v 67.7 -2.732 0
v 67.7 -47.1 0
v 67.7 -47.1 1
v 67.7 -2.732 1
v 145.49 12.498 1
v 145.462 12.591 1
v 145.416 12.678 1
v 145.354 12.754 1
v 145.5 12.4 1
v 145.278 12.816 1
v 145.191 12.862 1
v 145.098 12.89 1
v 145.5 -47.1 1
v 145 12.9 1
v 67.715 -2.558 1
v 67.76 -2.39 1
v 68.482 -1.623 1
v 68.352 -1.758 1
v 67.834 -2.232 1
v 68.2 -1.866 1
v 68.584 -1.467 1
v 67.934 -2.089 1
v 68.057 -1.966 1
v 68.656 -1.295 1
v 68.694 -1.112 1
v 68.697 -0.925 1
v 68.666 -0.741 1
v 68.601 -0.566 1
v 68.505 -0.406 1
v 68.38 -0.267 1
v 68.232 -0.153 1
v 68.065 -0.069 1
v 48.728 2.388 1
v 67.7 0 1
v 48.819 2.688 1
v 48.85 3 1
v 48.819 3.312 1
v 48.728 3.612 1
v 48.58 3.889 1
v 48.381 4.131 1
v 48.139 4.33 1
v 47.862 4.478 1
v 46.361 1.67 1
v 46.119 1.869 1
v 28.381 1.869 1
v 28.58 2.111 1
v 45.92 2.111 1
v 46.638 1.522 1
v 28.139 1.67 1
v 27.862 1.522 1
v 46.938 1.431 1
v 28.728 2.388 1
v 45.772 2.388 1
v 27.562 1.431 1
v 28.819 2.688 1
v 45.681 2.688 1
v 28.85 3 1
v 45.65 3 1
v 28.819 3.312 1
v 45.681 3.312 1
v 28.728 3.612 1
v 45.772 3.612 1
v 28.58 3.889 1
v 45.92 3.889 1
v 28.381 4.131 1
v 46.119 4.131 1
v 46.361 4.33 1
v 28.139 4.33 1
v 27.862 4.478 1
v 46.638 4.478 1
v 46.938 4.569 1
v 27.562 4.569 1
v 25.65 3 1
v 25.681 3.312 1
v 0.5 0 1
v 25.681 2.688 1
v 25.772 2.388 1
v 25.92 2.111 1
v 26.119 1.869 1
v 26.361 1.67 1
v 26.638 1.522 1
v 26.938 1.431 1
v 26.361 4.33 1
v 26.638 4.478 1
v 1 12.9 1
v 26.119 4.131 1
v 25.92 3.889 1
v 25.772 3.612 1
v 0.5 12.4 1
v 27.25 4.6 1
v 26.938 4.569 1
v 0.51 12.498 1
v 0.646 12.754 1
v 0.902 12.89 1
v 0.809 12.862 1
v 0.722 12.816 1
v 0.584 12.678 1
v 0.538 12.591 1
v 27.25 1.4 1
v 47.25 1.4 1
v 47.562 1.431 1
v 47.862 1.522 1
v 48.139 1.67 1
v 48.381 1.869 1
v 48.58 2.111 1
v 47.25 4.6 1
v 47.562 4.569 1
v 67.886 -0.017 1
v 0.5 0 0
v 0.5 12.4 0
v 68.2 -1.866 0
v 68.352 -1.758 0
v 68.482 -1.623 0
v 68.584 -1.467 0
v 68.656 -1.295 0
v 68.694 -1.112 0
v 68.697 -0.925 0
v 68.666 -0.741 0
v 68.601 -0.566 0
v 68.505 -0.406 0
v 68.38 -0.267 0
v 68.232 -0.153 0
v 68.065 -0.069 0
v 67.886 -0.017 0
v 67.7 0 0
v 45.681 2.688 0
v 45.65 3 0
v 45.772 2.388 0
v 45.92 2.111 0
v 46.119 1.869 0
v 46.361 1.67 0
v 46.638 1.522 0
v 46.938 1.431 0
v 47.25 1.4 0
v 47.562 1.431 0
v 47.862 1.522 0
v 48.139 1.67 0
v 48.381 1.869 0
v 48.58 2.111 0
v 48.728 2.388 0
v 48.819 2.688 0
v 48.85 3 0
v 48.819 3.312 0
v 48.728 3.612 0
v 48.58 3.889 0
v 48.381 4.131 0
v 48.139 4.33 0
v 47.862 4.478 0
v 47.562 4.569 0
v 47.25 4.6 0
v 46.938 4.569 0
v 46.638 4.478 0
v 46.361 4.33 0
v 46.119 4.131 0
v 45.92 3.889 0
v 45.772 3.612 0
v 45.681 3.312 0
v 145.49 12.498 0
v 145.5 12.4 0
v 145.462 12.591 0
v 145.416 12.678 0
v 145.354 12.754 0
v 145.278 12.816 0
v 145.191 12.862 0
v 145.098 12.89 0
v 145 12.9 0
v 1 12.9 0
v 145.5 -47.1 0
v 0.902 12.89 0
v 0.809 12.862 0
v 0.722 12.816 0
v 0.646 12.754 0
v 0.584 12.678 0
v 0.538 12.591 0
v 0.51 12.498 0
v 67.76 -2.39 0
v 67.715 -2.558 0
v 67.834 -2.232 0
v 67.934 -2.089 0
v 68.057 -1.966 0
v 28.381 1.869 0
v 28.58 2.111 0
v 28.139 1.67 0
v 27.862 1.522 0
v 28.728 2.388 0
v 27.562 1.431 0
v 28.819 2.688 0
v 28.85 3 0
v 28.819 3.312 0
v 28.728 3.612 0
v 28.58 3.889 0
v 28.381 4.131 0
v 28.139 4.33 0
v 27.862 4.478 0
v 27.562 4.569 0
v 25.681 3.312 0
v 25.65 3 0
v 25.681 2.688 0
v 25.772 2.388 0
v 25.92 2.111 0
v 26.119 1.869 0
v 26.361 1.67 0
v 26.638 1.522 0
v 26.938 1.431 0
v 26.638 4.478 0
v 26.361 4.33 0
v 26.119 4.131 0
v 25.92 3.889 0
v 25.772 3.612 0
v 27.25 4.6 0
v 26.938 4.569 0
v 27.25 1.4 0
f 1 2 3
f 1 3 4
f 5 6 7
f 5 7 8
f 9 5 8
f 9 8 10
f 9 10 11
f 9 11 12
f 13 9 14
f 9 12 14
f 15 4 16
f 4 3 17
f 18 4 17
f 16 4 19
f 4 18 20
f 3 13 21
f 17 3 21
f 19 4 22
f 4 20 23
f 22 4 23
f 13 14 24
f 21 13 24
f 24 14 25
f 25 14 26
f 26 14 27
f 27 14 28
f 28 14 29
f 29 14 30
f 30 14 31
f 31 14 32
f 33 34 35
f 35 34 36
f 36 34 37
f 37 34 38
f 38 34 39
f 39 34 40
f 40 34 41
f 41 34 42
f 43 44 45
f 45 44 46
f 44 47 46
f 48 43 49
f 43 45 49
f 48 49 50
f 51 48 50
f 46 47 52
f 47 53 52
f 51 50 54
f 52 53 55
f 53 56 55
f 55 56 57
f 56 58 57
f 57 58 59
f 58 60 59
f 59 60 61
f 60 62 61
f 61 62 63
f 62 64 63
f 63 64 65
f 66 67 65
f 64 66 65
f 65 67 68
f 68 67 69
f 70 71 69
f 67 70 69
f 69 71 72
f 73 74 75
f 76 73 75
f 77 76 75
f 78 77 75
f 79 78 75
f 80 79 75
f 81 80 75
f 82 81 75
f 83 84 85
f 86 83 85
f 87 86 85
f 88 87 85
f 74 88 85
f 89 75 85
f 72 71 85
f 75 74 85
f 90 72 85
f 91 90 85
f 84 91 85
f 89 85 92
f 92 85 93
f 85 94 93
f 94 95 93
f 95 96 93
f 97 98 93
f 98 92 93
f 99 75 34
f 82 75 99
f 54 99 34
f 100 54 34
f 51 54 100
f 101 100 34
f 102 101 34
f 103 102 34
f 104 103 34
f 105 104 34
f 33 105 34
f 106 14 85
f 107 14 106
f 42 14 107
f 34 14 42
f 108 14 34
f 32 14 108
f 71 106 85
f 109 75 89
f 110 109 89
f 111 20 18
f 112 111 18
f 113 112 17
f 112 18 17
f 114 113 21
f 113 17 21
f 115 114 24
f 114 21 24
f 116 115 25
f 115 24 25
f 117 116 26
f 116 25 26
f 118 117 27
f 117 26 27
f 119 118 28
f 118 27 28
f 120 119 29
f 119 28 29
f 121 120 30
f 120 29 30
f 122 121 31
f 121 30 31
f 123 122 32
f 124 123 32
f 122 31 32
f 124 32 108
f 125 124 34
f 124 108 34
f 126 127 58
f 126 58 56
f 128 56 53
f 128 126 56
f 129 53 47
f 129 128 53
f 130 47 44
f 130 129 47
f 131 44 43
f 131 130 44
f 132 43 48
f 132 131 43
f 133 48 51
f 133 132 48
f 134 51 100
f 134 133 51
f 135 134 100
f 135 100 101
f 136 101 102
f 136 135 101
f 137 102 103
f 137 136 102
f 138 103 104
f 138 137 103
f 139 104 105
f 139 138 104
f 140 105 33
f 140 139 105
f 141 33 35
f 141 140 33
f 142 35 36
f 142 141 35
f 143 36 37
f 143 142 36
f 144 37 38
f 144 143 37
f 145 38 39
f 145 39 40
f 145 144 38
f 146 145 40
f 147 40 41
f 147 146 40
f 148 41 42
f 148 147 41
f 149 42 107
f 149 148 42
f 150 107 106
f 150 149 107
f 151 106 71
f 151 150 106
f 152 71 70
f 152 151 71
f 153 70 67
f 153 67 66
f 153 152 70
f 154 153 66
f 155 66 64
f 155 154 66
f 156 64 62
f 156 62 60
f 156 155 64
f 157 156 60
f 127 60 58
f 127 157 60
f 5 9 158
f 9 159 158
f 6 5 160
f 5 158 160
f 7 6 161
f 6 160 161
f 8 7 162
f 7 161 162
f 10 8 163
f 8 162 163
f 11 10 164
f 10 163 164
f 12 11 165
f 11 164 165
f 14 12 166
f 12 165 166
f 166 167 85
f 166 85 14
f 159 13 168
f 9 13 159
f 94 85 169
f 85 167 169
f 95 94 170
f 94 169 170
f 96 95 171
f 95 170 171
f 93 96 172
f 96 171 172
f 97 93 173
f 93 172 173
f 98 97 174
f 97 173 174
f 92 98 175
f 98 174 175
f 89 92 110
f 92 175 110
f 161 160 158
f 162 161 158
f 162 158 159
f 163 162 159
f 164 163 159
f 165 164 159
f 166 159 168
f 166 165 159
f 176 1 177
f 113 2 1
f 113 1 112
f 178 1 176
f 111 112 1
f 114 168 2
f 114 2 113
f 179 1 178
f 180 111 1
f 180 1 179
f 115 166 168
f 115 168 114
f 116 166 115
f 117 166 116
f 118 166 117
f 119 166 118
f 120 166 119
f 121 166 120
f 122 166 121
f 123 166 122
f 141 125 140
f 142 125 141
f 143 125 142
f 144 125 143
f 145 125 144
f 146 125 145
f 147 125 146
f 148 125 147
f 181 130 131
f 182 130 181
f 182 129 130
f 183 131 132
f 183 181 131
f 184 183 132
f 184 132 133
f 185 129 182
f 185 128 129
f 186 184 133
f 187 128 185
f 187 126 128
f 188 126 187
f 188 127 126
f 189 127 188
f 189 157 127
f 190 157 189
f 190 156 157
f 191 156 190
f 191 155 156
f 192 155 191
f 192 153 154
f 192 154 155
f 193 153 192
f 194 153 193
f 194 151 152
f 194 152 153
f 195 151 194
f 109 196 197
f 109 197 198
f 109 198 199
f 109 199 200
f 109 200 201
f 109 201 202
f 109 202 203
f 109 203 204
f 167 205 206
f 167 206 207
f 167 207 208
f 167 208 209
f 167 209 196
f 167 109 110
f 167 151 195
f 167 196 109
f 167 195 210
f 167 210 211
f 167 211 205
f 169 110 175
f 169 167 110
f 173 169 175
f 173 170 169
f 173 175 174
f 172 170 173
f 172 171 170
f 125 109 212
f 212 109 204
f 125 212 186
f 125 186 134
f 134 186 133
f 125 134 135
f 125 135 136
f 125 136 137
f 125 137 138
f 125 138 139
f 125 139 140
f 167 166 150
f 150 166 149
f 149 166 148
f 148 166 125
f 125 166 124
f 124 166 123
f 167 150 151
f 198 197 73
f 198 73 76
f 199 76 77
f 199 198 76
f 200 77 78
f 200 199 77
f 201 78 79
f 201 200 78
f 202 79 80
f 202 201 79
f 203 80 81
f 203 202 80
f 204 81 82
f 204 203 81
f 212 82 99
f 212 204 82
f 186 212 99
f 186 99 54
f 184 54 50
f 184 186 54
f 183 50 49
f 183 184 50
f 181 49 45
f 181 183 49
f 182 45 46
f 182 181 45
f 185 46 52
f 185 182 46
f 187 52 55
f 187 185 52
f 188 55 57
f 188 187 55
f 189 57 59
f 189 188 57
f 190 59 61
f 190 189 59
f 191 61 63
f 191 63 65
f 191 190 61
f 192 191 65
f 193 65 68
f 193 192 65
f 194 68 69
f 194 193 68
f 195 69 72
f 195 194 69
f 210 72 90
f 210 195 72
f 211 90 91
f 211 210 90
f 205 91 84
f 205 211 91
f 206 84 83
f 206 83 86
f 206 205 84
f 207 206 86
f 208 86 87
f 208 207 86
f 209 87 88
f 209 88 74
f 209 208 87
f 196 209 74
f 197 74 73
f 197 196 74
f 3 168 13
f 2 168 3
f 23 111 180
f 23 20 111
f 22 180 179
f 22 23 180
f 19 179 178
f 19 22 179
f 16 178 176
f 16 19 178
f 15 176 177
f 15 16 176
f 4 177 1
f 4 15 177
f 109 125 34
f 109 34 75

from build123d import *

# Parameters (mm, degrees)
SKETCH_1_R          = 1.6
EXTRUDE_1_DEPTH     = 1
SKETCH_2_R          = 1
CUT_EXTRUDE_1_DEPTH = 10
FILLET_1_R          = 1
SKETCH_3_W          = 0.5
SKETCH_3_H          = 12.9
SKETCH_3_H_2        = 60
CUT_EXTRUDE_2_DEPTH = 154.412548379
FILLET_2_R          = 0.5


with BuildPart() as part:
    # 草图1 → 凸台-拉伸1 (new body)
    with BuildSketch(Plane.XY):
        Polygon((0, 0), (0, 12.9), (146, 12.9), (146, -47.1), (67.7, -47.1), (67.7, 0), align=None)
        with Locations(Location((47.25, 3, 0), (0, 0, 180))):
            Circle(SKETCH_1_R, mode=Mode.SUBTRACT)
        with Locations(Location((27.25, 3, 0), (0, 0, 180))):
            Circle(SKETCH_1_R, mode=Mode.SUBTRACT)
    extrude(amount=EXTRUDE_1_DEPTH)

    # 草图2 → 切除-拉伸1 (cut)
    with BuildSketch(Plane.XY.offset(1)):
        with Locations((67.7, -1)):
            Circle(SKETCH_2_R)
    extrude(amount=-CUT_EXTRUDE_1_DEPTH, mode=Mode.SUBTRACT)

    # 圆角1
    fillet_1_edges = [part.edges().sort_by_distance(p)[0] for p in [
        (67.7, -2, 0.5),
    ]]
    fillet(fillet_1_edges, radius=FILLET_1_R)

    # 草图3 → 切除-拉伸2 (cut, through all)
    with BuildSketch(Plane.XY.offset(1)):
        with Locations((0.25, 6.45)):
            Rectangle(SKETCH_3_W, SKETCH_3_H)
        with Locations((145.75, -17.1)):
            Rectangle(SKETCH_3_W, SKETCH_3_H_2)
    extrude(amount=-CUT_EXTRUDE_2_DEPTH, mode=Mode.SUBTRACT)

    # 圆角2
    fillet_2_edges = [part.edges().sort_by_distance(p)[0] for p in [
        (0.5, 12.9, 0.5),
        (145.5, 12.9, 0.5),
    ]]
    fillet(fillet_2_edges, radius=FILLET_2_R)


solid = part.part
